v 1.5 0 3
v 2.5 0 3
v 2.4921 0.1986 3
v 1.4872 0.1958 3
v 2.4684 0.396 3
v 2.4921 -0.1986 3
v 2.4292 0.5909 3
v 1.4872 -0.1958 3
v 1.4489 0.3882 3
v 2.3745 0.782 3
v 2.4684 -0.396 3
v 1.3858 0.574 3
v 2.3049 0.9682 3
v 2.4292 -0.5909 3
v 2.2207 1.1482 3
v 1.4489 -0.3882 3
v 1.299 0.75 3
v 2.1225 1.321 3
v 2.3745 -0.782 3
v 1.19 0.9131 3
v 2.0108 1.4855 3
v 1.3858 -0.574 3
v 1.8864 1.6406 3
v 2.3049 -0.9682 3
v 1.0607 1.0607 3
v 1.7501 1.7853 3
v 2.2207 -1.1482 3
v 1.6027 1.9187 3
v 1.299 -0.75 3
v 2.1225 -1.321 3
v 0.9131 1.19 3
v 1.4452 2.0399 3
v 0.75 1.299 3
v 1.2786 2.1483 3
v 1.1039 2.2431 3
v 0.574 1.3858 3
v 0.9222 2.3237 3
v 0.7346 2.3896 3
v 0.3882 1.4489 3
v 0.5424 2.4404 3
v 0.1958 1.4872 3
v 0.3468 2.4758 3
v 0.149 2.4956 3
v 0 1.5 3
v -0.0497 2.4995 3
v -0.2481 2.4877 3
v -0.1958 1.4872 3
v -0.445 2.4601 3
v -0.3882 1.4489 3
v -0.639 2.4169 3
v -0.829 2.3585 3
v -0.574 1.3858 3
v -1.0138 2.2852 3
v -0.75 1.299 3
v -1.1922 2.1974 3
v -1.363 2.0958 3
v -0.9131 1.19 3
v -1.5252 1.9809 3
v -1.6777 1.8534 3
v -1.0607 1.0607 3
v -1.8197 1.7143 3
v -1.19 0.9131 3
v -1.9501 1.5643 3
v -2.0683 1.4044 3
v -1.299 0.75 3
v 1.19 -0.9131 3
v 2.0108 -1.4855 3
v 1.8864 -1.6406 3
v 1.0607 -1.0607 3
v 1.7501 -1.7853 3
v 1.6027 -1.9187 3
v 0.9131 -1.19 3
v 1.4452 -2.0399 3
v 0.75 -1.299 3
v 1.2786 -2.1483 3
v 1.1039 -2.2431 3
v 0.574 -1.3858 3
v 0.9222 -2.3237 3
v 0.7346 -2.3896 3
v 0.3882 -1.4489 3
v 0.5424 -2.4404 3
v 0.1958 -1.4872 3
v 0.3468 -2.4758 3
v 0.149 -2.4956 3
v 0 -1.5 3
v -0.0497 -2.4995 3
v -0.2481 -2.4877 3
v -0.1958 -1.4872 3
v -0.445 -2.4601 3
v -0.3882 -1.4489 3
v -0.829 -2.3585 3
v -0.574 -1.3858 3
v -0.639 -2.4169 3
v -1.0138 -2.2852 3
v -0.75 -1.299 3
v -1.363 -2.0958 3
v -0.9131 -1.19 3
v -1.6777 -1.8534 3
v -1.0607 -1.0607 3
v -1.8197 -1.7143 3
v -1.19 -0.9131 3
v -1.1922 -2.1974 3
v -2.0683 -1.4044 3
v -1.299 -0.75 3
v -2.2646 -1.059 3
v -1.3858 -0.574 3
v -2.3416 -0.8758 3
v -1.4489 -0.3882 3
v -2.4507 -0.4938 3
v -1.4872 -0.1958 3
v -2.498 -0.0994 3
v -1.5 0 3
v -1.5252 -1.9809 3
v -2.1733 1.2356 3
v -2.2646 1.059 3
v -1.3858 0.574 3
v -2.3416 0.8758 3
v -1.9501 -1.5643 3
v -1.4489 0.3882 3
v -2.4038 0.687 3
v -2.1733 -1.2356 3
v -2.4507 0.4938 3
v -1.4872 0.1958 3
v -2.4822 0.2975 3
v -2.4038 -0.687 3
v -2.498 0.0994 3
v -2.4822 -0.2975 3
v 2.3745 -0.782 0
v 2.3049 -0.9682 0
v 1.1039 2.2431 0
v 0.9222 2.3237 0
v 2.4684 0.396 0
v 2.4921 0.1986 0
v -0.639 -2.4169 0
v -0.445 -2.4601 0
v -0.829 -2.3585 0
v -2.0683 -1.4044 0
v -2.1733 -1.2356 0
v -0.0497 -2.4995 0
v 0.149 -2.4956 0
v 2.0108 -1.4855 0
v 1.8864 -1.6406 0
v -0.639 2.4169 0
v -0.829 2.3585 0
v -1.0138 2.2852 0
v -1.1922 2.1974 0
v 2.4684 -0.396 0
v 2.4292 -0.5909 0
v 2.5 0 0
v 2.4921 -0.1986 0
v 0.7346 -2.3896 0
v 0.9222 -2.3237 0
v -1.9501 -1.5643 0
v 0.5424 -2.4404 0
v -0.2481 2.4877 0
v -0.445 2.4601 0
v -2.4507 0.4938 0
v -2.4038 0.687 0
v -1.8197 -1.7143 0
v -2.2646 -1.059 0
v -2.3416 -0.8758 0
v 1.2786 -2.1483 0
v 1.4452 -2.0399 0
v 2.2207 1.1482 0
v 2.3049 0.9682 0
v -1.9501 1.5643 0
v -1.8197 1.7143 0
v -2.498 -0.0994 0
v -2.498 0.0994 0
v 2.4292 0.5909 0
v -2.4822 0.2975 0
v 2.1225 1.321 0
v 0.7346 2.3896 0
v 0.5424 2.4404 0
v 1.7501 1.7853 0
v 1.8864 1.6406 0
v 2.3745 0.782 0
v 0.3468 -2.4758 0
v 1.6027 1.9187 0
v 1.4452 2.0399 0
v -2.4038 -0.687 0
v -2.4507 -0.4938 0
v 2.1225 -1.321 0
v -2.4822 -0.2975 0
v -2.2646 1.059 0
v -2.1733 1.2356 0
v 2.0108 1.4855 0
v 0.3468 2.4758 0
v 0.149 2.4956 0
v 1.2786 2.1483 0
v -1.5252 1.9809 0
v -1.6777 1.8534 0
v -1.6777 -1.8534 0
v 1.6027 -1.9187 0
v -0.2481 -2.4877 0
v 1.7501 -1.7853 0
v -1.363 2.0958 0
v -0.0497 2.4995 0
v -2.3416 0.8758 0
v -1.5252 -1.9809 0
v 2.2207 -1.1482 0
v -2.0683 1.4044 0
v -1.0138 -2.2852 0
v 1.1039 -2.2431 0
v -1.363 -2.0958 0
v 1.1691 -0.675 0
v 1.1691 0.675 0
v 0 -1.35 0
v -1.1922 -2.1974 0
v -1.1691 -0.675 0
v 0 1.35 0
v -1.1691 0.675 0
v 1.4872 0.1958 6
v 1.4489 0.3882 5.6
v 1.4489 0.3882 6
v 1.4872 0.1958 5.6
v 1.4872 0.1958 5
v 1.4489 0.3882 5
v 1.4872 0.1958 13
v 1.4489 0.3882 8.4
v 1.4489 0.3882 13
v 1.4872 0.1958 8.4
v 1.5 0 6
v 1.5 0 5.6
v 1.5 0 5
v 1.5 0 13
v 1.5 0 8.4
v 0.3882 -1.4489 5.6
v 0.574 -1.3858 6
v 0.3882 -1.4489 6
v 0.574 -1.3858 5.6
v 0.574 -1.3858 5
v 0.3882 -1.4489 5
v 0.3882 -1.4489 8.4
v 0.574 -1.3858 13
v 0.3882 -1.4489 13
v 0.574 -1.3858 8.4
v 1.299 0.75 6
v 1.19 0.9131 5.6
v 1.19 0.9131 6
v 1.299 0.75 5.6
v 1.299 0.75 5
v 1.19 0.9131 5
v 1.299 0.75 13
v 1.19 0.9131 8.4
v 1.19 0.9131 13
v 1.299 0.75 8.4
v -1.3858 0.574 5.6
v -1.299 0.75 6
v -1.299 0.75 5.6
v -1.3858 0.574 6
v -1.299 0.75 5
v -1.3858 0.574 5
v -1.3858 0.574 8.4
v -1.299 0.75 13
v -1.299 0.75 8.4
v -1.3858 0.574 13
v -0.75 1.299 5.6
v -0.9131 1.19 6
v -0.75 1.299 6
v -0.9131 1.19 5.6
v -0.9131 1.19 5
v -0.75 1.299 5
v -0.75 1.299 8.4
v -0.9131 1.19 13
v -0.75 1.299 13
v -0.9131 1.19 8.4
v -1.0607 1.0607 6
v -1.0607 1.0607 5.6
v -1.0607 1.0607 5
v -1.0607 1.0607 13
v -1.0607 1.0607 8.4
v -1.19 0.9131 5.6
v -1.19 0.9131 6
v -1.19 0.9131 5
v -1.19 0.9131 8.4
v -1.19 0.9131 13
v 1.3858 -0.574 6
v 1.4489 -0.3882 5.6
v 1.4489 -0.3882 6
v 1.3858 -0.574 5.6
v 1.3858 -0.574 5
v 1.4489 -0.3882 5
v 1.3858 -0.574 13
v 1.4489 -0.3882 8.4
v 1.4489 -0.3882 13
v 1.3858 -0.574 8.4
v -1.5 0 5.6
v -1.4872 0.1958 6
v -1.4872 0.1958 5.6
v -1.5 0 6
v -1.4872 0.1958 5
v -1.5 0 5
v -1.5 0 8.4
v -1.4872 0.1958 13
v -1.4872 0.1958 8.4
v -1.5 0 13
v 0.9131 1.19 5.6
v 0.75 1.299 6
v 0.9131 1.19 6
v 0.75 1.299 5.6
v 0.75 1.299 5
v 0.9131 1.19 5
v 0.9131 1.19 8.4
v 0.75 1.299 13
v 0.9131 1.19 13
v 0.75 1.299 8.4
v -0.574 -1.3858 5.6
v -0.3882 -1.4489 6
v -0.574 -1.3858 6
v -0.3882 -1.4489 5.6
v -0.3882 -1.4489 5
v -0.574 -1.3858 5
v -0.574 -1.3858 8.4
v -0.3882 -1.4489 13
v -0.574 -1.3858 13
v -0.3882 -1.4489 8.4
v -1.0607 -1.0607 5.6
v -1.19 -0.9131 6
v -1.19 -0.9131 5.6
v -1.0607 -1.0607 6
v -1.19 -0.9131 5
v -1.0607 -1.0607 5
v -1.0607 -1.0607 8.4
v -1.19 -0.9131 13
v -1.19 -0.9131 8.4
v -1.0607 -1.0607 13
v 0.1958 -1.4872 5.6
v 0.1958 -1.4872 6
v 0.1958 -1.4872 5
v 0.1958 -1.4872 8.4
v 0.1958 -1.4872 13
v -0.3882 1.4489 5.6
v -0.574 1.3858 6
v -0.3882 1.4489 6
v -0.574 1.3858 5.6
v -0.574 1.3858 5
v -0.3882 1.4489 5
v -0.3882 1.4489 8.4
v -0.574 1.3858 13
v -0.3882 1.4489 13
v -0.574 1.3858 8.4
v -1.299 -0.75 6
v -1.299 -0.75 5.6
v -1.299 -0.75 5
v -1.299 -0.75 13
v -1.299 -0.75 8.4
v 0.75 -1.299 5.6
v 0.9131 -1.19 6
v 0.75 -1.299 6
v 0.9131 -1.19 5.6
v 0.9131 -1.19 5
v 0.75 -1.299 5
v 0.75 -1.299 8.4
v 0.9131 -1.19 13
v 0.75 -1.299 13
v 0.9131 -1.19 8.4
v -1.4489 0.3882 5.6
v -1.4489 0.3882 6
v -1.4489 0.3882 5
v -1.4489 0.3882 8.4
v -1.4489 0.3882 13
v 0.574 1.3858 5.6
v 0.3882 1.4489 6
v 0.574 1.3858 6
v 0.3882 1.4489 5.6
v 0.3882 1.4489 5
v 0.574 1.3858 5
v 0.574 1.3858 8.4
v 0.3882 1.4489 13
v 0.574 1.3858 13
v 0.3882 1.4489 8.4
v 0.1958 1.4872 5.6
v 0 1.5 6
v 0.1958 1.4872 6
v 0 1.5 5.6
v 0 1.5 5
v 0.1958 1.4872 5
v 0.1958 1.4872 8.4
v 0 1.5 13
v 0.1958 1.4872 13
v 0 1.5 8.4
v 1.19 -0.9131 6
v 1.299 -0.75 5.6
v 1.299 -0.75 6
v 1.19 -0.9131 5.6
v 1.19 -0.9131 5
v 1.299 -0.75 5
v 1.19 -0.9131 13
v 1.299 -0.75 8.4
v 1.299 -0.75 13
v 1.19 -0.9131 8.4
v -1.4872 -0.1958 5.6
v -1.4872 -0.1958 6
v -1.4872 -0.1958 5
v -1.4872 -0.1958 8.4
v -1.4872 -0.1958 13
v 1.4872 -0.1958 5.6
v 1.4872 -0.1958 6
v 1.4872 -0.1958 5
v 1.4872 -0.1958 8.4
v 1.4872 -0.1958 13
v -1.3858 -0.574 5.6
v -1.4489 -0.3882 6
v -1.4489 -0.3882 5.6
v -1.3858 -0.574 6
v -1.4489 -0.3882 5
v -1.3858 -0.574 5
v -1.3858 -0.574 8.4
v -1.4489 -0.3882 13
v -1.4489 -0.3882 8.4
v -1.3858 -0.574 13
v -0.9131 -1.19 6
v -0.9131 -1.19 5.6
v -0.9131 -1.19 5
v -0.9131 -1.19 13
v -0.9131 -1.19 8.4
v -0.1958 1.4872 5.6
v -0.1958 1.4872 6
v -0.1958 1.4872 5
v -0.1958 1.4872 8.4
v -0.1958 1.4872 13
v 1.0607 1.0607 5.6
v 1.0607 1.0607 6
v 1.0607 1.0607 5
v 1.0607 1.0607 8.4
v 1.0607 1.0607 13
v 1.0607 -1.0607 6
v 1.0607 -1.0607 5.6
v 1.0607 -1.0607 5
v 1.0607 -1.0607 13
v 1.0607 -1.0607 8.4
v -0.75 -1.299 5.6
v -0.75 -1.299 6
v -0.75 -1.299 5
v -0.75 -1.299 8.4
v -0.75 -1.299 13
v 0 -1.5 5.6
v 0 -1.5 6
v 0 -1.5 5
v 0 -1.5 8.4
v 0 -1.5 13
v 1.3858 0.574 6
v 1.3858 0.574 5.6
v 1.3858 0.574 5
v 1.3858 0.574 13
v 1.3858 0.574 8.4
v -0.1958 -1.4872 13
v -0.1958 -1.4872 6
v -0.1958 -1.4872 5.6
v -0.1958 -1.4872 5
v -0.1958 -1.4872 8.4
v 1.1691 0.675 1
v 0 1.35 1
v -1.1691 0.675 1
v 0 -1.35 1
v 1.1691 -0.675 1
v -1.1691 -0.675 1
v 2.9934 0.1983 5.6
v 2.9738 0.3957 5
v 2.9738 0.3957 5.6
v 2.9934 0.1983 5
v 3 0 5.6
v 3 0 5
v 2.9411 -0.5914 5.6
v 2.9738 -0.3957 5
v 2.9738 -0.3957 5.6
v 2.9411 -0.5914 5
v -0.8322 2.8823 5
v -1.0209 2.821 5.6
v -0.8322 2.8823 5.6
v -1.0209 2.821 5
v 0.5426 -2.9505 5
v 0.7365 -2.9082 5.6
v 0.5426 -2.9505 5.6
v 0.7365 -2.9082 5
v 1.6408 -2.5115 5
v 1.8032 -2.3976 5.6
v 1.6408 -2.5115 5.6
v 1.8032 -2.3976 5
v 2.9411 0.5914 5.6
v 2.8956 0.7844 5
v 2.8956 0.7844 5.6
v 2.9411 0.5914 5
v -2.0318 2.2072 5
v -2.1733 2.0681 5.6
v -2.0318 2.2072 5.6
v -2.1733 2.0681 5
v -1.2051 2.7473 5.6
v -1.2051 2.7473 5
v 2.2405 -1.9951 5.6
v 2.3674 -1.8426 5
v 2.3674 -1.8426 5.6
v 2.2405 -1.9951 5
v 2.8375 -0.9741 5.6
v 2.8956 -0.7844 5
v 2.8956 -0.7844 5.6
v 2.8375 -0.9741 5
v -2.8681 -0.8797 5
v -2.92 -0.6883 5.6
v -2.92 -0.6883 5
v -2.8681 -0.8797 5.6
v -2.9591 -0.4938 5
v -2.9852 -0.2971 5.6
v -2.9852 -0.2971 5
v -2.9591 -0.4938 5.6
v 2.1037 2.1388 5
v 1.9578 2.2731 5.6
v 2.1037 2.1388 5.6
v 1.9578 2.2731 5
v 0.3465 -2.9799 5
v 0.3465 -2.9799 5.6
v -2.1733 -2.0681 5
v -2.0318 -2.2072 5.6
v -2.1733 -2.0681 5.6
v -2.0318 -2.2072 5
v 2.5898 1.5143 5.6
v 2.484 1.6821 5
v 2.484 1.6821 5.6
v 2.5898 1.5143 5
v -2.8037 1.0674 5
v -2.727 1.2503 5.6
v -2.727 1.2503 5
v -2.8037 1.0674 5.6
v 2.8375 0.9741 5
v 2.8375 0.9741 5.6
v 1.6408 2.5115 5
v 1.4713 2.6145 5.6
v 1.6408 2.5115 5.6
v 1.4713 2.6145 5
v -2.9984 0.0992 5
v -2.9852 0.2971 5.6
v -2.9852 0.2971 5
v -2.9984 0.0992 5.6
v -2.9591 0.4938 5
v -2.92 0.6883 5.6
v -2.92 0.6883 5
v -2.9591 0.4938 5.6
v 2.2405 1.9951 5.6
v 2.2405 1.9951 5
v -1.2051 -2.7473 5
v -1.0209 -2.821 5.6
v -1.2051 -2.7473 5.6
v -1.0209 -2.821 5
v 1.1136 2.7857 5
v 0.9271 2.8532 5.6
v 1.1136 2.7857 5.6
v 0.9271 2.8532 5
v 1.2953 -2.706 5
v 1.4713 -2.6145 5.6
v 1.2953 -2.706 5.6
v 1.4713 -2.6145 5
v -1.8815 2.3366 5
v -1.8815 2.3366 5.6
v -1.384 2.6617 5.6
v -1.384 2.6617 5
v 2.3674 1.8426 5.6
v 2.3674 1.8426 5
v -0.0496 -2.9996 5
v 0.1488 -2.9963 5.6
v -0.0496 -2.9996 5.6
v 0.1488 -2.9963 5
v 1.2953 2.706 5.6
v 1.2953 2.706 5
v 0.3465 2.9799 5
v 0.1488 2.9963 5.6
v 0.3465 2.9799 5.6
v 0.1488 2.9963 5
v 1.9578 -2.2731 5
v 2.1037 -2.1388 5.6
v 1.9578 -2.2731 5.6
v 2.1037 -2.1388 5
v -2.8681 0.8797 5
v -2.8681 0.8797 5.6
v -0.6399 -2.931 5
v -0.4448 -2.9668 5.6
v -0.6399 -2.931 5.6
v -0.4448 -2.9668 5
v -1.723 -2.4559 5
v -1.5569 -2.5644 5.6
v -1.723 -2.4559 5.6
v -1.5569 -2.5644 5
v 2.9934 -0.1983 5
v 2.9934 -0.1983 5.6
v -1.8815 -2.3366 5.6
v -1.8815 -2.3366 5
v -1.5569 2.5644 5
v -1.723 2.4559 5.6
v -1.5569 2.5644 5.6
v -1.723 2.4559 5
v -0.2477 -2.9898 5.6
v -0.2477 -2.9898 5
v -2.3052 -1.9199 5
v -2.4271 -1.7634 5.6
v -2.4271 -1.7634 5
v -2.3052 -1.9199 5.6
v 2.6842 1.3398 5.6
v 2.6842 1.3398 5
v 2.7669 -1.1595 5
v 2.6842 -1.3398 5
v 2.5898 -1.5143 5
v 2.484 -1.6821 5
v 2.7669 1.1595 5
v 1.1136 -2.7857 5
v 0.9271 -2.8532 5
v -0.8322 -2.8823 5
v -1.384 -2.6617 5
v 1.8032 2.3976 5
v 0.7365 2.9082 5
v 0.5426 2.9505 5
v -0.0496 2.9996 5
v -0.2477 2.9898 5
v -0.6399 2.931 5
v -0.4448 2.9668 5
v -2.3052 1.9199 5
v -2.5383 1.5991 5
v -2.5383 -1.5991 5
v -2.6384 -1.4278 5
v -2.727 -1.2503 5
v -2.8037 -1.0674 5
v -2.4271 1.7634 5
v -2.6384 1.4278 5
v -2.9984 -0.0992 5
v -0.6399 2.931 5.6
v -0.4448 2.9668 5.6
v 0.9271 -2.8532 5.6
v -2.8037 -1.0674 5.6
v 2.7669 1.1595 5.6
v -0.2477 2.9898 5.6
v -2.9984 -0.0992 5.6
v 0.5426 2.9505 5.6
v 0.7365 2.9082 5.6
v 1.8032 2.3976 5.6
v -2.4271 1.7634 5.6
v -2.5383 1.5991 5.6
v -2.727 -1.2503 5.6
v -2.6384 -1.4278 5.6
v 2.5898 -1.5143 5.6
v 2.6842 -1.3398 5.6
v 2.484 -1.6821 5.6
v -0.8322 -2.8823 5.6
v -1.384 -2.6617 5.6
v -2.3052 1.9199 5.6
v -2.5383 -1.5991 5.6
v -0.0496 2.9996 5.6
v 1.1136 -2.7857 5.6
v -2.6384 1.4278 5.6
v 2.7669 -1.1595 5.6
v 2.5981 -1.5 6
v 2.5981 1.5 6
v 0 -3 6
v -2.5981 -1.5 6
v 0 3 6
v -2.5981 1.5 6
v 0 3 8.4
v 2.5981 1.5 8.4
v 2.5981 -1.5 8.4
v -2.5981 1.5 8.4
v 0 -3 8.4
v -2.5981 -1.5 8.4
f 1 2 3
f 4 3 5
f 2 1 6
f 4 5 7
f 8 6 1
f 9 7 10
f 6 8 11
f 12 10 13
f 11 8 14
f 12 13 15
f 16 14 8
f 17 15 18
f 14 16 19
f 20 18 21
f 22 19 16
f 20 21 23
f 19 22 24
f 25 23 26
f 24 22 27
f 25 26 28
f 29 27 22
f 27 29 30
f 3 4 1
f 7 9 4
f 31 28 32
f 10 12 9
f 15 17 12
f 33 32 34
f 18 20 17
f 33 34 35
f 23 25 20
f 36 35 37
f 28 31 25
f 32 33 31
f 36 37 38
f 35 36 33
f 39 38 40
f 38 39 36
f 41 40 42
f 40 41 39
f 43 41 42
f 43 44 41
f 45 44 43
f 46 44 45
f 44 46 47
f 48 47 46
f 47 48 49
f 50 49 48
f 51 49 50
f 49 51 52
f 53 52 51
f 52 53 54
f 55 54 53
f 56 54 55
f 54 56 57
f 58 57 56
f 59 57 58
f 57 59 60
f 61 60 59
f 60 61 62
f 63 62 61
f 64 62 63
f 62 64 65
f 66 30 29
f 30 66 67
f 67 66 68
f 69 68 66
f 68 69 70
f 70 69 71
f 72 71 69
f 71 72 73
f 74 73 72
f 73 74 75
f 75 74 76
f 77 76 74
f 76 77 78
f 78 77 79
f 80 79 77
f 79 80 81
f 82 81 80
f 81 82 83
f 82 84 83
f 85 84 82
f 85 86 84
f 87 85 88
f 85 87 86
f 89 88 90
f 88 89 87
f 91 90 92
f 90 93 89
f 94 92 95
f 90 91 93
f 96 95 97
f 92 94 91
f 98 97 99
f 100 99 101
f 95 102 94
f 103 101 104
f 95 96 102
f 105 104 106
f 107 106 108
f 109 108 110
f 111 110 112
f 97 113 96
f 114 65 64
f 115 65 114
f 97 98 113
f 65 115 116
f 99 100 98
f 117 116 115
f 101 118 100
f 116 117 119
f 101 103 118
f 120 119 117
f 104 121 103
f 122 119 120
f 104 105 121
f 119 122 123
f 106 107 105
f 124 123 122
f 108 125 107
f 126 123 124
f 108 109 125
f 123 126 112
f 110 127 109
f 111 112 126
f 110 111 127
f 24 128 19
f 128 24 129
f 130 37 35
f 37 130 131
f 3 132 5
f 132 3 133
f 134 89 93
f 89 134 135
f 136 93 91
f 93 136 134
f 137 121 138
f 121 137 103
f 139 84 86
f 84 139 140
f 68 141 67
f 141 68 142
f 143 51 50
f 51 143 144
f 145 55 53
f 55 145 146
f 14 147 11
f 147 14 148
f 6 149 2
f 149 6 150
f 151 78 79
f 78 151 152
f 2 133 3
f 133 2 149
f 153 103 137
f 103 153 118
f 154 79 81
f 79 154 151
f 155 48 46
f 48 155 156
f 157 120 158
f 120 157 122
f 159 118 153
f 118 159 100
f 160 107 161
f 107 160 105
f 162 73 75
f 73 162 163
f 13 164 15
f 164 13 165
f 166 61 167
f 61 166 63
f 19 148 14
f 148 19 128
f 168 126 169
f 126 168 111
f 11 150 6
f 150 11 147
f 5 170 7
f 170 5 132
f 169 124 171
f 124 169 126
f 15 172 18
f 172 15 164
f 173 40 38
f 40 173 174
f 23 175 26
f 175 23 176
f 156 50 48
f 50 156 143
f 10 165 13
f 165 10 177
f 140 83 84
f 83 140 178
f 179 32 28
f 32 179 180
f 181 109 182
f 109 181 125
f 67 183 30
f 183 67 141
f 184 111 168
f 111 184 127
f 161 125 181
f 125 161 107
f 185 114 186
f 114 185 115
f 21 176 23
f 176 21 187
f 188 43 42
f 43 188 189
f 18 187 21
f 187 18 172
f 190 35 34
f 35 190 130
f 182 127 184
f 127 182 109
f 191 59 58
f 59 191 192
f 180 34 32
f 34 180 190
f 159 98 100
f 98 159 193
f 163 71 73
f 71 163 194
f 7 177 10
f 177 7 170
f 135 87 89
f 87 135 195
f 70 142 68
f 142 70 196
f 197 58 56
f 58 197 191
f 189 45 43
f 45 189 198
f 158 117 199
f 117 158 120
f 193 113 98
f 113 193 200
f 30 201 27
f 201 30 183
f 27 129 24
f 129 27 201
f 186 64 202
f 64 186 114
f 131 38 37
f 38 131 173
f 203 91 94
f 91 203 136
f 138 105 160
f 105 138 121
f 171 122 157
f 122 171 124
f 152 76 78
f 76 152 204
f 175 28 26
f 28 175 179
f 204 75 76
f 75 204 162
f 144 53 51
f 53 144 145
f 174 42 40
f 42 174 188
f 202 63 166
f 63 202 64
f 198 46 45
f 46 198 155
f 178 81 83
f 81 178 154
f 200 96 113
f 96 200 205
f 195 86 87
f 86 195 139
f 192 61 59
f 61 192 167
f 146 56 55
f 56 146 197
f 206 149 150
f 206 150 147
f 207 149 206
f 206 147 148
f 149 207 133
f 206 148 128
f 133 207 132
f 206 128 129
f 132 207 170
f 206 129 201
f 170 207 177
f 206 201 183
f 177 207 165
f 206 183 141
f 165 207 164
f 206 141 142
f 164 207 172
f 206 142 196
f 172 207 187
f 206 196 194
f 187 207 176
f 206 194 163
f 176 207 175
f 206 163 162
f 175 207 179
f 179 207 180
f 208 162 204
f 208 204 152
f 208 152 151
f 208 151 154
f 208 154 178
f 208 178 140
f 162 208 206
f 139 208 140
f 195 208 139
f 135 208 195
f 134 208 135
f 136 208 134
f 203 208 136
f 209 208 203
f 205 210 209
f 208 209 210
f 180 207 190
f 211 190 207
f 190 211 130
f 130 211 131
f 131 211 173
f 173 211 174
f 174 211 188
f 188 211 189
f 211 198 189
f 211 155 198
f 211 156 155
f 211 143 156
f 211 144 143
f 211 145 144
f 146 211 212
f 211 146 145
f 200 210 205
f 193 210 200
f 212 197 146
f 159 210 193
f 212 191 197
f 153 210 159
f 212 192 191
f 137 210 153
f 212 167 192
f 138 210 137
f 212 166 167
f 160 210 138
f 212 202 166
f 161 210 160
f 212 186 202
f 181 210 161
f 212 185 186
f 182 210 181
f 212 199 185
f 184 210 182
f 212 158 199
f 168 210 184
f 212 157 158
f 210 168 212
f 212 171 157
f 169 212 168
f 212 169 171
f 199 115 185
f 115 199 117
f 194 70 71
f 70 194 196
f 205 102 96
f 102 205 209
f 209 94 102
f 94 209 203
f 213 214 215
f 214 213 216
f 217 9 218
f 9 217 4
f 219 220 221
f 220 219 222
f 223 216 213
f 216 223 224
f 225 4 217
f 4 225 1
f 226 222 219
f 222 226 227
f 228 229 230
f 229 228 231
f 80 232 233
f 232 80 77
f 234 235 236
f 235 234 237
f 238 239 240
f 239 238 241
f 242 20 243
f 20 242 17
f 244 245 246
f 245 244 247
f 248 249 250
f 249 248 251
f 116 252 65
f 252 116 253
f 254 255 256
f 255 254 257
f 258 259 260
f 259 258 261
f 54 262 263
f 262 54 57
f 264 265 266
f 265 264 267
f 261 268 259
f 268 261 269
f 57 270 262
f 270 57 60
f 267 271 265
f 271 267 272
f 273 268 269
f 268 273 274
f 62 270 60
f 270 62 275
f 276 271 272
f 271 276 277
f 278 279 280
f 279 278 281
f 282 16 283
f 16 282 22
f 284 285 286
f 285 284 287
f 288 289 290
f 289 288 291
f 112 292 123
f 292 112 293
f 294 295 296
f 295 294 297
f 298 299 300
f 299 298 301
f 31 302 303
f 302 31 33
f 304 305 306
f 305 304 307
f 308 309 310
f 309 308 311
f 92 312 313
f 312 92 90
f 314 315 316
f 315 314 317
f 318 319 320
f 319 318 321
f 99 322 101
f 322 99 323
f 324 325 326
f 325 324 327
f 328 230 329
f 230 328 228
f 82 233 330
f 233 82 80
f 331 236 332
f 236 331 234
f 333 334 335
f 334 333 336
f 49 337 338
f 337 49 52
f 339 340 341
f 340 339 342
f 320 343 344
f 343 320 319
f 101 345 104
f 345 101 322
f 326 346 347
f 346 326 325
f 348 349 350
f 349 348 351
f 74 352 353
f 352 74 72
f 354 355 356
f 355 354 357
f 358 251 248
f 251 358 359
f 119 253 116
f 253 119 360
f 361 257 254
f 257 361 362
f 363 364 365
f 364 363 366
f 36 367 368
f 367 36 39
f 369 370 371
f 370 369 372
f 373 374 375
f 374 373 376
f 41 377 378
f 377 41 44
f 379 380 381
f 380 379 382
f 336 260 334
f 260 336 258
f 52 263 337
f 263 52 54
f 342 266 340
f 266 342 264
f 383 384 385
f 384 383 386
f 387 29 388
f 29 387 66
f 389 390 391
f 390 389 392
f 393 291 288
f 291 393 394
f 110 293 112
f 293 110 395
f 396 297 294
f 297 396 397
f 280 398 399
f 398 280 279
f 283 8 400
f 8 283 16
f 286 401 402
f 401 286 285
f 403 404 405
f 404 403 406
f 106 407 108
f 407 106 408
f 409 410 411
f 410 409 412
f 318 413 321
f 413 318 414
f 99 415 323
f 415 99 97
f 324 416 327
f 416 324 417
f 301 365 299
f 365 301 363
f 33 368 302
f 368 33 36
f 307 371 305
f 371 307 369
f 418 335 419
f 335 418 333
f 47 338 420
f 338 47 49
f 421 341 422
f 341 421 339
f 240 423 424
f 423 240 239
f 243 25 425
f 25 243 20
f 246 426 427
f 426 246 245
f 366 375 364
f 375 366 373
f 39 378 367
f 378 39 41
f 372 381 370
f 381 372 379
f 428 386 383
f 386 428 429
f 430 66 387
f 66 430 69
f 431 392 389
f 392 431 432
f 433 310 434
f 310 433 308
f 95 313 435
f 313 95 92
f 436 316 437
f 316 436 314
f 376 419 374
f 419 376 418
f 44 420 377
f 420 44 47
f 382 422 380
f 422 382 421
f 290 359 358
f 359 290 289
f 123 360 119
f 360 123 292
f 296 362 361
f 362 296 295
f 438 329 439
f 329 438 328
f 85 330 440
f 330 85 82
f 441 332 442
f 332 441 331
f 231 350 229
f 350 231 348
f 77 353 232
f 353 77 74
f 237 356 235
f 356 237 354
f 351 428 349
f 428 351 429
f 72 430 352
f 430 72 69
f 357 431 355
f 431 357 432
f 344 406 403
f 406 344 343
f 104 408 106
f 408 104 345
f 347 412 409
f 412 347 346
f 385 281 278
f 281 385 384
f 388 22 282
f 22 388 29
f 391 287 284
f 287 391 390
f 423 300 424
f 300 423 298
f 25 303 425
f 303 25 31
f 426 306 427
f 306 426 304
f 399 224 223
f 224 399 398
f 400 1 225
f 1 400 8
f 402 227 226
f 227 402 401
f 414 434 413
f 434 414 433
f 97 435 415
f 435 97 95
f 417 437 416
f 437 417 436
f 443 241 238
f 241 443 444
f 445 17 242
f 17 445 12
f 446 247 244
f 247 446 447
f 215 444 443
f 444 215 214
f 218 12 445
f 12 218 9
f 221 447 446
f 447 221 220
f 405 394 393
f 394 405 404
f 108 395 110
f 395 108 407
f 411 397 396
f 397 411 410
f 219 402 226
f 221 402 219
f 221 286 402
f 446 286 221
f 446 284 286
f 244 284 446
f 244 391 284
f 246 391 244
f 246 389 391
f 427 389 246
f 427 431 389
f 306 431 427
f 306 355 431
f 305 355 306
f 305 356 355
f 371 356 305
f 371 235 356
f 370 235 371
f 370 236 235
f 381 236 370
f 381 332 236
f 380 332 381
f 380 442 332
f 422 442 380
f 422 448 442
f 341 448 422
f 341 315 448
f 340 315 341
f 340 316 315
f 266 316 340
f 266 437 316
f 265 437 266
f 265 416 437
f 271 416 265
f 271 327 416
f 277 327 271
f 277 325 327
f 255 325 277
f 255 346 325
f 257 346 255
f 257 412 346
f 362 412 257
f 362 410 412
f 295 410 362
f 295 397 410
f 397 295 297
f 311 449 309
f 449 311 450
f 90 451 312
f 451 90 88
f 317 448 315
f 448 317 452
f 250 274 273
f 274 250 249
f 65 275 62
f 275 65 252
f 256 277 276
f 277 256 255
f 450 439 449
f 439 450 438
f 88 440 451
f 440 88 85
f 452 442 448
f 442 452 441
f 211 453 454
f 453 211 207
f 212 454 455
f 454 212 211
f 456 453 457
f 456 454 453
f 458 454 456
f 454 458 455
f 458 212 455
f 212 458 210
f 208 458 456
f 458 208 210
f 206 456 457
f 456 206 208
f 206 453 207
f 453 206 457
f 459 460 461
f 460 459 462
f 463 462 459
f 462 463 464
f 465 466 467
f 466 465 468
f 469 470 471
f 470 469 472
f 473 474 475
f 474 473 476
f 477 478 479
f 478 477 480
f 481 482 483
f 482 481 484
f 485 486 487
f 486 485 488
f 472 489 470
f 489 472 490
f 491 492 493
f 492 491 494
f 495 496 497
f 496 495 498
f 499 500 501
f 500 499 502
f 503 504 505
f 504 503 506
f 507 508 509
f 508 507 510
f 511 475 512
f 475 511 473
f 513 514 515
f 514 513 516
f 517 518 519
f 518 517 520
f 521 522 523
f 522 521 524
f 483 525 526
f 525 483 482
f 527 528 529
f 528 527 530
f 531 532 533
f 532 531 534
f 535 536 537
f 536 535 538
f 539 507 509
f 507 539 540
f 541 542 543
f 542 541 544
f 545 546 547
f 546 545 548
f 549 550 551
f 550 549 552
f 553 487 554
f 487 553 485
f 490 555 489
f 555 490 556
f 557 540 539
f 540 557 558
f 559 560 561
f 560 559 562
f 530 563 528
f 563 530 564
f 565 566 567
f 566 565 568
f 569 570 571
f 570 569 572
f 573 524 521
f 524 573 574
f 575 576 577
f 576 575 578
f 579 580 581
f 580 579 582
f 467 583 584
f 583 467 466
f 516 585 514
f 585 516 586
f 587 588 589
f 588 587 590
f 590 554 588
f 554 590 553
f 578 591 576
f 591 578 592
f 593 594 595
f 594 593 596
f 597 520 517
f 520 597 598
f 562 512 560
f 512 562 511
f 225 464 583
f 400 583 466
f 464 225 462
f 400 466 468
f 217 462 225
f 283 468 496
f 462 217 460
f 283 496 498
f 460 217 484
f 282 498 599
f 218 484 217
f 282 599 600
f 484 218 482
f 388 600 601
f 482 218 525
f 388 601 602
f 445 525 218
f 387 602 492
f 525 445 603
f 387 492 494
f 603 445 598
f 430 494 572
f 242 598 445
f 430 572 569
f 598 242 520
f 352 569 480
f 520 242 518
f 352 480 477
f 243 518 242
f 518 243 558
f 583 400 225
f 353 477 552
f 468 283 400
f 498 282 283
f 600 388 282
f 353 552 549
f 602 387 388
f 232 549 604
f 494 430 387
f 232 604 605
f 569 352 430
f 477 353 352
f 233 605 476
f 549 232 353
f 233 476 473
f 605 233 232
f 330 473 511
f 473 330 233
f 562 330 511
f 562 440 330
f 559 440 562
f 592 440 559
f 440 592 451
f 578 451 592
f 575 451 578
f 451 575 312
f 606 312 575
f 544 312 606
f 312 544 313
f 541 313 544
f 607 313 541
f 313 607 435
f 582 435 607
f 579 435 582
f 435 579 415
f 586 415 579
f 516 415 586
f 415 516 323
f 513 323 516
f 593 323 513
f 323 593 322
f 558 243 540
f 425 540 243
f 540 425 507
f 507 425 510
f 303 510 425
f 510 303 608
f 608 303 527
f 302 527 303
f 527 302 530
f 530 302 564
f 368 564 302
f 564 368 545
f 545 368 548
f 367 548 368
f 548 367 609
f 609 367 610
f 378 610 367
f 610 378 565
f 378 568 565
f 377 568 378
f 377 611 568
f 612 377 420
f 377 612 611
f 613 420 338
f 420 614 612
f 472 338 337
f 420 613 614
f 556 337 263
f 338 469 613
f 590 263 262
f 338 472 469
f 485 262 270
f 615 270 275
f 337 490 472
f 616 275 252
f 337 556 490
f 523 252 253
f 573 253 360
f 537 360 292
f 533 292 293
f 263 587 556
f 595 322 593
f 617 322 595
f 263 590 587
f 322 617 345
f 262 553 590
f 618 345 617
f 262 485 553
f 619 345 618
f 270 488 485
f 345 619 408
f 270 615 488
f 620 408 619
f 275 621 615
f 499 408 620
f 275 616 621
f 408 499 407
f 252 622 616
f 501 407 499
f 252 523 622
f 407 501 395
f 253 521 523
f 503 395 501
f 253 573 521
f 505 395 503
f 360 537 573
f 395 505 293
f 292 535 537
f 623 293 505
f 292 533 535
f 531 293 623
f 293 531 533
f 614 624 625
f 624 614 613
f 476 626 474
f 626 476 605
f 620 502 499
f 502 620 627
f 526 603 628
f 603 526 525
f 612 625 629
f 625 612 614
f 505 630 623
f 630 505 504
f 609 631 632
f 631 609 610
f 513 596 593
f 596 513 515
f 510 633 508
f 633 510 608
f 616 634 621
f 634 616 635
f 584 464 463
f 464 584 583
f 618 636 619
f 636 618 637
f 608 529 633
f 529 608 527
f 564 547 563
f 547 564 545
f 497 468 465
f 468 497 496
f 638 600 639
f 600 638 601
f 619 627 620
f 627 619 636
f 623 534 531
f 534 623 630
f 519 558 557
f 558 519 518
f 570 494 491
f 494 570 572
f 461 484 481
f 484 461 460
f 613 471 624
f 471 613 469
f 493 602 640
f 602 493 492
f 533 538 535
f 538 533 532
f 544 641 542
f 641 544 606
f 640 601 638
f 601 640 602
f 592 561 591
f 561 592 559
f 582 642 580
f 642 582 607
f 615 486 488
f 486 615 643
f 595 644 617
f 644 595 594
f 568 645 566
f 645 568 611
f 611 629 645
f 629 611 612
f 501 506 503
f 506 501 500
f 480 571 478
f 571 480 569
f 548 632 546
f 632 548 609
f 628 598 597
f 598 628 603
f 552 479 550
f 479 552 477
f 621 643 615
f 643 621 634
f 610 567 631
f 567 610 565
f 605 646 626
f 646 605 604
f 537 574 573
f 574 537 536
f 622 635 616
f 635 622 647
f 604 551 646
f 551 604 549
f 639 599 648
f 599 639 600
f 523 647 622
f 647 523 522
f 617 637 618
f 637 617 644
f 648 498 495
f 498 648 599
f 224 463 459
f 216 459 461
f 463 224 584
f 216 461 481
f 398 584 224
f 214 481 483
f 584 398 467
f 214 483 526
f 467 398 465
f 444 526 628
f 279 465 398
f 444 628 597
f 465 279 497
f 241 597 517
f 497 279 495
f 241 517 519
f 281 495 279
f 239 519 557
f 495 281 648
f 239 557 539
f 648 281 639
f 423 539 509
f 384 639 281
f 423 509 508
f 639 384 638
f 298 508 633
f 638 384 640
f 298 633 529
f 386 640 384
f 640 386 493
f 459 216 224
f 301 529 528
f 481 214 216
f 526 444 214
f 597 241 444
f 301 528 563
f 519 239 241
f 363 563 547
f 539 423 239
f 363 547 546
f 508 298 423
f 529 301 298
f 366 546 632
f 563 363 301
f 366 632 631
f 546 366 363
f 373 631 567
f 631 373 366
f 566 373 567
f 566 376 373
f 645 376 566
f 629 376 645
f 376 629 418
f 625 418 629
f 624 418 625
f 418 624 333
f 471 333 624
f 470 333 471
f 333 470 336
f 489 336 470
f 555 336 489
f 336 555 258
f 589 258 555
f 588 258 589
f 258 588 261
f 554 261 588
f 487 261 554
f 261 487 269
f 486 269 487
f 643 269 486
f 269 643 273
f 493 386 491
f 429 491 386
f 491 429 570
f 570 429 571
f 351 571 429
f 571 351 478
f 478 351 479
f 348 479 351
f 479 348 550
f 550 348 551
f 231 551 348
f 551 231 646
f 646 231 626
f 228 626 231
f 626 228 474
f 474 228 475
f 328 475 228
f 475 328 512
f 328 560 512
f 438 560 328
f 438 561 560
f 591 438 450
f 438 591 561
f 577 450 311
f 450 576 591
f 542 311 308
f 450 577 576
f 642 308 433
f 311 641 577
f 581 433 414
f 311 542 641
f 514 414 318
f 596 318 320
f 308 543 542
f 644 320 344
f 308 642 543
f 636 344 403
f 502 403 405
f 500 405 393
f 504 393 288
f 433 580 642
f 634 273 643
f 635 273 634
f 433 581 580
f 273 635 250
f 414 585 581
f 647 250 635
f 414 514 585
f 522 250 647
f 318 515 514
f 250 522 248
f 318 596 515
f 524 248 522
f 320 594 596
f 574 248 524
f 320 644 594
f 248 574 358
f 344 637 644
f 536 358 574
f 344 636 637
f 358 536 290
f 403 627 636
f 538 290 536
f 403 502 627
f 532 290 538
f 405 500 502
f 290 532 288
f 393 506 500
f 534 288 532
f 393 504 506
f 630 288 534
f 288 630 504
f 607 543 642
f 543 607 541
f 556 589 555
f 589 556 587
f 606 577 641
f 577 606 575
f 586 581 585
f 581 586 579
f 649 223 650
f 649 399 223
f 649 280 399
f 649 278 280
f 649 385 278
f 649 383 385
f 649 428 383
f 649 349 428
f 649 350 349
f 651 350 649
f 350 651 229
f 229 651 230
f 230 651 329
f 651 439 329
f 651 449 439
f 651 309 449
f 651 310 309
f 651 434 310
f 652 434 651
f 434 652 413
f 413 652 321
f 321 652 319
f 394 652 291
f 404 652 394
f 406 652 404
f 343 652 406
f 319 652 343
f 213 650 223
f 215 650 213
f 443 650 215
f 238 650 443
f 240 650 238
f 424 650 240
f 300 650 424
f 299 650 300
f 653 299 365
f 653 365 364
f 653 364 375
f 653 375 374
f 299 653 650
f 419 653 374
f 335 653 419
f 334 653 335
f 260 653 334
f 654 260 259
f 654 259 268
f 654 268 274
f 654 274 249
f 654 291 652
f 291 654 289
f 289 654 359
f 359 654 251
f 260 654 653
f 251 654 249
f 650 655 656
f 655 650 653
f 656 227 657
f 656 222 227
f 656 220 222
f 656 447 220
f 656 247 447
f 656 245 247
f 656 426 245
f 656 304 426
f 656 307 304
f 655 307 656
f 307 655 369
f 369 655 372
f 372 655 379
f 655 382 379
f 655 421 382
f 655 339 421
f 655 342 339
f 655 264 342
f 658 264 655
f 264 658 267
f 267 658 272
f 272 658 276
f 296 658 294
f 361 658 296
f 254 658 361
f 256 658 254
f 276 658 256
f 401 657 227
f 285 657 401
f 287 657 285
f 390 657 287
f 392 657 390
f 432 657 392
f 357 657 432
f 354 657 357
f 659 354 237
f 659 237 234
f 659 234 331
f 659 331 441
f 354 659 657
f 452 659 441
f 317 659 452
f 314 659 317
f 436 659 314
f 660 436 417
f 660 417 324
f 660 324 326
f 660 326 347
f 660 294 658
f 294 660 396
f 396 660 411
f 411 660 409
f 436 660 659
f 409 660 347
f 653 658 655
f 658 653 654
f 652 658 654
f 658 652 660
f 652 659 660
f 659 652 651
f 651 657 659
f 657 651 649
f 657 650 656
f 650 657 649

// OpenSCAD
// file: util.scad
$fa=.2;
$fs=.2;

$RED=[1,0,0,1];
$RED_D=[.5,0,0,1];
$RED_L=[1,.5,.5,1];

$GREEN=[0,1,0,1];
$GREEN_D=[0,.5,0,1];
$GREEN_L=[.5,1,.5,1];

$BLUE=[0,0,1,1];
$BLUE_D=[0,0,.5,1];
$BLUE_L=[.5,.5,1,1];

$YELLOW=[1,1,0,1];
$YELLOW_D=[.5,.5,0,1];
$YELLOW_L=[1,1,.5,1];

module t(x,y,z) translate([x,y,z]) children();
module tx(x) t(x,0,0) children();
module ty(y) t(0,y,0) children();
module tz(z) t(0,0,z) children();

module r(x,y,z) rotate([x,y,z]) children();
module rx(x) r(x,0,0) children();
module ry(y) r(0,y,0) children();
module rz(z) r(0,0,z) children();

module s(x,y,z) scale([x,y,z]) children();
module sx(x) s(x,1,1) children();
module sy(y) s(1,y,1) children();
module sz(z) s(1,1,z) children();

module c(r,g,b) color([r,g,b,1]) children();
module ca(r,g,b,a) color([r,g,b,a]) children();
module col(c) color(c) children();

module box(x,y,z) cube([x,y,z]);
module cyl(h,r) cylinder(h,r,r);
module hcyl(h,R,r) difference() { cyl(h,R); tz(-1) cyl(h+2,r); }
module poly(coords) polygon(coords);
// main file
use <util.scad>;

module screw(hh,hd,sh,sd) {
	color("#800000") {
		cyl(hh,hd/2);
		cyl(hh+sh,sd/2);
	}
}

module nut(h,do,di) {
	color("#800000")
	difference() {
		linear_extrude(h)
		polygon([
			let(r=do/2)
			for (i=[0:5])	
			let(a=i*60)
			let(x=r*sin(a))
			let(y=r*cos(a))
			[x,y]
		]);

		tz(-1)
		cyl(h+2, di/2);
	}
}

module washer(h,do,di) {
	color("#804000")
	hcyl(h,do/2,di/2);
}

module screwM3(h) {
	difference() {
		screw(3,5,h,3);
		tz(-1)
		linear_extrude(2)
		polygon([
			let(r=1.35)
			for (i=[0:5])	
			let(a=i*60)
			let(x=r*sin(a))
			let(y=r*cos(a))
			[x,y]
		]);
	}
}

module screwM3x5(h) screwM3(5);
module screwM3x6(h) screwM3(6);
module screwM3x8(h) screwM3(8);
module screwM3x10(h) screwM3(10);
module screwM3x12(h) screwM3(12);
module screwM3x14(h) screwM3(14);
module screwM3x16(h) screwM3(16);
module screwM3x18(h) screwM3(18);
module screwM3x20(h) screwM3(20);
module screwM3x25(h) screwM3(25);
module screwM3x30(h) screwM3(30);
module nutM3() nut(2.4,6,3);
module washerM3() washer(.6,6,3);

screwM3x10();
tz(5) washerM3();
tz(6) nutM3();
